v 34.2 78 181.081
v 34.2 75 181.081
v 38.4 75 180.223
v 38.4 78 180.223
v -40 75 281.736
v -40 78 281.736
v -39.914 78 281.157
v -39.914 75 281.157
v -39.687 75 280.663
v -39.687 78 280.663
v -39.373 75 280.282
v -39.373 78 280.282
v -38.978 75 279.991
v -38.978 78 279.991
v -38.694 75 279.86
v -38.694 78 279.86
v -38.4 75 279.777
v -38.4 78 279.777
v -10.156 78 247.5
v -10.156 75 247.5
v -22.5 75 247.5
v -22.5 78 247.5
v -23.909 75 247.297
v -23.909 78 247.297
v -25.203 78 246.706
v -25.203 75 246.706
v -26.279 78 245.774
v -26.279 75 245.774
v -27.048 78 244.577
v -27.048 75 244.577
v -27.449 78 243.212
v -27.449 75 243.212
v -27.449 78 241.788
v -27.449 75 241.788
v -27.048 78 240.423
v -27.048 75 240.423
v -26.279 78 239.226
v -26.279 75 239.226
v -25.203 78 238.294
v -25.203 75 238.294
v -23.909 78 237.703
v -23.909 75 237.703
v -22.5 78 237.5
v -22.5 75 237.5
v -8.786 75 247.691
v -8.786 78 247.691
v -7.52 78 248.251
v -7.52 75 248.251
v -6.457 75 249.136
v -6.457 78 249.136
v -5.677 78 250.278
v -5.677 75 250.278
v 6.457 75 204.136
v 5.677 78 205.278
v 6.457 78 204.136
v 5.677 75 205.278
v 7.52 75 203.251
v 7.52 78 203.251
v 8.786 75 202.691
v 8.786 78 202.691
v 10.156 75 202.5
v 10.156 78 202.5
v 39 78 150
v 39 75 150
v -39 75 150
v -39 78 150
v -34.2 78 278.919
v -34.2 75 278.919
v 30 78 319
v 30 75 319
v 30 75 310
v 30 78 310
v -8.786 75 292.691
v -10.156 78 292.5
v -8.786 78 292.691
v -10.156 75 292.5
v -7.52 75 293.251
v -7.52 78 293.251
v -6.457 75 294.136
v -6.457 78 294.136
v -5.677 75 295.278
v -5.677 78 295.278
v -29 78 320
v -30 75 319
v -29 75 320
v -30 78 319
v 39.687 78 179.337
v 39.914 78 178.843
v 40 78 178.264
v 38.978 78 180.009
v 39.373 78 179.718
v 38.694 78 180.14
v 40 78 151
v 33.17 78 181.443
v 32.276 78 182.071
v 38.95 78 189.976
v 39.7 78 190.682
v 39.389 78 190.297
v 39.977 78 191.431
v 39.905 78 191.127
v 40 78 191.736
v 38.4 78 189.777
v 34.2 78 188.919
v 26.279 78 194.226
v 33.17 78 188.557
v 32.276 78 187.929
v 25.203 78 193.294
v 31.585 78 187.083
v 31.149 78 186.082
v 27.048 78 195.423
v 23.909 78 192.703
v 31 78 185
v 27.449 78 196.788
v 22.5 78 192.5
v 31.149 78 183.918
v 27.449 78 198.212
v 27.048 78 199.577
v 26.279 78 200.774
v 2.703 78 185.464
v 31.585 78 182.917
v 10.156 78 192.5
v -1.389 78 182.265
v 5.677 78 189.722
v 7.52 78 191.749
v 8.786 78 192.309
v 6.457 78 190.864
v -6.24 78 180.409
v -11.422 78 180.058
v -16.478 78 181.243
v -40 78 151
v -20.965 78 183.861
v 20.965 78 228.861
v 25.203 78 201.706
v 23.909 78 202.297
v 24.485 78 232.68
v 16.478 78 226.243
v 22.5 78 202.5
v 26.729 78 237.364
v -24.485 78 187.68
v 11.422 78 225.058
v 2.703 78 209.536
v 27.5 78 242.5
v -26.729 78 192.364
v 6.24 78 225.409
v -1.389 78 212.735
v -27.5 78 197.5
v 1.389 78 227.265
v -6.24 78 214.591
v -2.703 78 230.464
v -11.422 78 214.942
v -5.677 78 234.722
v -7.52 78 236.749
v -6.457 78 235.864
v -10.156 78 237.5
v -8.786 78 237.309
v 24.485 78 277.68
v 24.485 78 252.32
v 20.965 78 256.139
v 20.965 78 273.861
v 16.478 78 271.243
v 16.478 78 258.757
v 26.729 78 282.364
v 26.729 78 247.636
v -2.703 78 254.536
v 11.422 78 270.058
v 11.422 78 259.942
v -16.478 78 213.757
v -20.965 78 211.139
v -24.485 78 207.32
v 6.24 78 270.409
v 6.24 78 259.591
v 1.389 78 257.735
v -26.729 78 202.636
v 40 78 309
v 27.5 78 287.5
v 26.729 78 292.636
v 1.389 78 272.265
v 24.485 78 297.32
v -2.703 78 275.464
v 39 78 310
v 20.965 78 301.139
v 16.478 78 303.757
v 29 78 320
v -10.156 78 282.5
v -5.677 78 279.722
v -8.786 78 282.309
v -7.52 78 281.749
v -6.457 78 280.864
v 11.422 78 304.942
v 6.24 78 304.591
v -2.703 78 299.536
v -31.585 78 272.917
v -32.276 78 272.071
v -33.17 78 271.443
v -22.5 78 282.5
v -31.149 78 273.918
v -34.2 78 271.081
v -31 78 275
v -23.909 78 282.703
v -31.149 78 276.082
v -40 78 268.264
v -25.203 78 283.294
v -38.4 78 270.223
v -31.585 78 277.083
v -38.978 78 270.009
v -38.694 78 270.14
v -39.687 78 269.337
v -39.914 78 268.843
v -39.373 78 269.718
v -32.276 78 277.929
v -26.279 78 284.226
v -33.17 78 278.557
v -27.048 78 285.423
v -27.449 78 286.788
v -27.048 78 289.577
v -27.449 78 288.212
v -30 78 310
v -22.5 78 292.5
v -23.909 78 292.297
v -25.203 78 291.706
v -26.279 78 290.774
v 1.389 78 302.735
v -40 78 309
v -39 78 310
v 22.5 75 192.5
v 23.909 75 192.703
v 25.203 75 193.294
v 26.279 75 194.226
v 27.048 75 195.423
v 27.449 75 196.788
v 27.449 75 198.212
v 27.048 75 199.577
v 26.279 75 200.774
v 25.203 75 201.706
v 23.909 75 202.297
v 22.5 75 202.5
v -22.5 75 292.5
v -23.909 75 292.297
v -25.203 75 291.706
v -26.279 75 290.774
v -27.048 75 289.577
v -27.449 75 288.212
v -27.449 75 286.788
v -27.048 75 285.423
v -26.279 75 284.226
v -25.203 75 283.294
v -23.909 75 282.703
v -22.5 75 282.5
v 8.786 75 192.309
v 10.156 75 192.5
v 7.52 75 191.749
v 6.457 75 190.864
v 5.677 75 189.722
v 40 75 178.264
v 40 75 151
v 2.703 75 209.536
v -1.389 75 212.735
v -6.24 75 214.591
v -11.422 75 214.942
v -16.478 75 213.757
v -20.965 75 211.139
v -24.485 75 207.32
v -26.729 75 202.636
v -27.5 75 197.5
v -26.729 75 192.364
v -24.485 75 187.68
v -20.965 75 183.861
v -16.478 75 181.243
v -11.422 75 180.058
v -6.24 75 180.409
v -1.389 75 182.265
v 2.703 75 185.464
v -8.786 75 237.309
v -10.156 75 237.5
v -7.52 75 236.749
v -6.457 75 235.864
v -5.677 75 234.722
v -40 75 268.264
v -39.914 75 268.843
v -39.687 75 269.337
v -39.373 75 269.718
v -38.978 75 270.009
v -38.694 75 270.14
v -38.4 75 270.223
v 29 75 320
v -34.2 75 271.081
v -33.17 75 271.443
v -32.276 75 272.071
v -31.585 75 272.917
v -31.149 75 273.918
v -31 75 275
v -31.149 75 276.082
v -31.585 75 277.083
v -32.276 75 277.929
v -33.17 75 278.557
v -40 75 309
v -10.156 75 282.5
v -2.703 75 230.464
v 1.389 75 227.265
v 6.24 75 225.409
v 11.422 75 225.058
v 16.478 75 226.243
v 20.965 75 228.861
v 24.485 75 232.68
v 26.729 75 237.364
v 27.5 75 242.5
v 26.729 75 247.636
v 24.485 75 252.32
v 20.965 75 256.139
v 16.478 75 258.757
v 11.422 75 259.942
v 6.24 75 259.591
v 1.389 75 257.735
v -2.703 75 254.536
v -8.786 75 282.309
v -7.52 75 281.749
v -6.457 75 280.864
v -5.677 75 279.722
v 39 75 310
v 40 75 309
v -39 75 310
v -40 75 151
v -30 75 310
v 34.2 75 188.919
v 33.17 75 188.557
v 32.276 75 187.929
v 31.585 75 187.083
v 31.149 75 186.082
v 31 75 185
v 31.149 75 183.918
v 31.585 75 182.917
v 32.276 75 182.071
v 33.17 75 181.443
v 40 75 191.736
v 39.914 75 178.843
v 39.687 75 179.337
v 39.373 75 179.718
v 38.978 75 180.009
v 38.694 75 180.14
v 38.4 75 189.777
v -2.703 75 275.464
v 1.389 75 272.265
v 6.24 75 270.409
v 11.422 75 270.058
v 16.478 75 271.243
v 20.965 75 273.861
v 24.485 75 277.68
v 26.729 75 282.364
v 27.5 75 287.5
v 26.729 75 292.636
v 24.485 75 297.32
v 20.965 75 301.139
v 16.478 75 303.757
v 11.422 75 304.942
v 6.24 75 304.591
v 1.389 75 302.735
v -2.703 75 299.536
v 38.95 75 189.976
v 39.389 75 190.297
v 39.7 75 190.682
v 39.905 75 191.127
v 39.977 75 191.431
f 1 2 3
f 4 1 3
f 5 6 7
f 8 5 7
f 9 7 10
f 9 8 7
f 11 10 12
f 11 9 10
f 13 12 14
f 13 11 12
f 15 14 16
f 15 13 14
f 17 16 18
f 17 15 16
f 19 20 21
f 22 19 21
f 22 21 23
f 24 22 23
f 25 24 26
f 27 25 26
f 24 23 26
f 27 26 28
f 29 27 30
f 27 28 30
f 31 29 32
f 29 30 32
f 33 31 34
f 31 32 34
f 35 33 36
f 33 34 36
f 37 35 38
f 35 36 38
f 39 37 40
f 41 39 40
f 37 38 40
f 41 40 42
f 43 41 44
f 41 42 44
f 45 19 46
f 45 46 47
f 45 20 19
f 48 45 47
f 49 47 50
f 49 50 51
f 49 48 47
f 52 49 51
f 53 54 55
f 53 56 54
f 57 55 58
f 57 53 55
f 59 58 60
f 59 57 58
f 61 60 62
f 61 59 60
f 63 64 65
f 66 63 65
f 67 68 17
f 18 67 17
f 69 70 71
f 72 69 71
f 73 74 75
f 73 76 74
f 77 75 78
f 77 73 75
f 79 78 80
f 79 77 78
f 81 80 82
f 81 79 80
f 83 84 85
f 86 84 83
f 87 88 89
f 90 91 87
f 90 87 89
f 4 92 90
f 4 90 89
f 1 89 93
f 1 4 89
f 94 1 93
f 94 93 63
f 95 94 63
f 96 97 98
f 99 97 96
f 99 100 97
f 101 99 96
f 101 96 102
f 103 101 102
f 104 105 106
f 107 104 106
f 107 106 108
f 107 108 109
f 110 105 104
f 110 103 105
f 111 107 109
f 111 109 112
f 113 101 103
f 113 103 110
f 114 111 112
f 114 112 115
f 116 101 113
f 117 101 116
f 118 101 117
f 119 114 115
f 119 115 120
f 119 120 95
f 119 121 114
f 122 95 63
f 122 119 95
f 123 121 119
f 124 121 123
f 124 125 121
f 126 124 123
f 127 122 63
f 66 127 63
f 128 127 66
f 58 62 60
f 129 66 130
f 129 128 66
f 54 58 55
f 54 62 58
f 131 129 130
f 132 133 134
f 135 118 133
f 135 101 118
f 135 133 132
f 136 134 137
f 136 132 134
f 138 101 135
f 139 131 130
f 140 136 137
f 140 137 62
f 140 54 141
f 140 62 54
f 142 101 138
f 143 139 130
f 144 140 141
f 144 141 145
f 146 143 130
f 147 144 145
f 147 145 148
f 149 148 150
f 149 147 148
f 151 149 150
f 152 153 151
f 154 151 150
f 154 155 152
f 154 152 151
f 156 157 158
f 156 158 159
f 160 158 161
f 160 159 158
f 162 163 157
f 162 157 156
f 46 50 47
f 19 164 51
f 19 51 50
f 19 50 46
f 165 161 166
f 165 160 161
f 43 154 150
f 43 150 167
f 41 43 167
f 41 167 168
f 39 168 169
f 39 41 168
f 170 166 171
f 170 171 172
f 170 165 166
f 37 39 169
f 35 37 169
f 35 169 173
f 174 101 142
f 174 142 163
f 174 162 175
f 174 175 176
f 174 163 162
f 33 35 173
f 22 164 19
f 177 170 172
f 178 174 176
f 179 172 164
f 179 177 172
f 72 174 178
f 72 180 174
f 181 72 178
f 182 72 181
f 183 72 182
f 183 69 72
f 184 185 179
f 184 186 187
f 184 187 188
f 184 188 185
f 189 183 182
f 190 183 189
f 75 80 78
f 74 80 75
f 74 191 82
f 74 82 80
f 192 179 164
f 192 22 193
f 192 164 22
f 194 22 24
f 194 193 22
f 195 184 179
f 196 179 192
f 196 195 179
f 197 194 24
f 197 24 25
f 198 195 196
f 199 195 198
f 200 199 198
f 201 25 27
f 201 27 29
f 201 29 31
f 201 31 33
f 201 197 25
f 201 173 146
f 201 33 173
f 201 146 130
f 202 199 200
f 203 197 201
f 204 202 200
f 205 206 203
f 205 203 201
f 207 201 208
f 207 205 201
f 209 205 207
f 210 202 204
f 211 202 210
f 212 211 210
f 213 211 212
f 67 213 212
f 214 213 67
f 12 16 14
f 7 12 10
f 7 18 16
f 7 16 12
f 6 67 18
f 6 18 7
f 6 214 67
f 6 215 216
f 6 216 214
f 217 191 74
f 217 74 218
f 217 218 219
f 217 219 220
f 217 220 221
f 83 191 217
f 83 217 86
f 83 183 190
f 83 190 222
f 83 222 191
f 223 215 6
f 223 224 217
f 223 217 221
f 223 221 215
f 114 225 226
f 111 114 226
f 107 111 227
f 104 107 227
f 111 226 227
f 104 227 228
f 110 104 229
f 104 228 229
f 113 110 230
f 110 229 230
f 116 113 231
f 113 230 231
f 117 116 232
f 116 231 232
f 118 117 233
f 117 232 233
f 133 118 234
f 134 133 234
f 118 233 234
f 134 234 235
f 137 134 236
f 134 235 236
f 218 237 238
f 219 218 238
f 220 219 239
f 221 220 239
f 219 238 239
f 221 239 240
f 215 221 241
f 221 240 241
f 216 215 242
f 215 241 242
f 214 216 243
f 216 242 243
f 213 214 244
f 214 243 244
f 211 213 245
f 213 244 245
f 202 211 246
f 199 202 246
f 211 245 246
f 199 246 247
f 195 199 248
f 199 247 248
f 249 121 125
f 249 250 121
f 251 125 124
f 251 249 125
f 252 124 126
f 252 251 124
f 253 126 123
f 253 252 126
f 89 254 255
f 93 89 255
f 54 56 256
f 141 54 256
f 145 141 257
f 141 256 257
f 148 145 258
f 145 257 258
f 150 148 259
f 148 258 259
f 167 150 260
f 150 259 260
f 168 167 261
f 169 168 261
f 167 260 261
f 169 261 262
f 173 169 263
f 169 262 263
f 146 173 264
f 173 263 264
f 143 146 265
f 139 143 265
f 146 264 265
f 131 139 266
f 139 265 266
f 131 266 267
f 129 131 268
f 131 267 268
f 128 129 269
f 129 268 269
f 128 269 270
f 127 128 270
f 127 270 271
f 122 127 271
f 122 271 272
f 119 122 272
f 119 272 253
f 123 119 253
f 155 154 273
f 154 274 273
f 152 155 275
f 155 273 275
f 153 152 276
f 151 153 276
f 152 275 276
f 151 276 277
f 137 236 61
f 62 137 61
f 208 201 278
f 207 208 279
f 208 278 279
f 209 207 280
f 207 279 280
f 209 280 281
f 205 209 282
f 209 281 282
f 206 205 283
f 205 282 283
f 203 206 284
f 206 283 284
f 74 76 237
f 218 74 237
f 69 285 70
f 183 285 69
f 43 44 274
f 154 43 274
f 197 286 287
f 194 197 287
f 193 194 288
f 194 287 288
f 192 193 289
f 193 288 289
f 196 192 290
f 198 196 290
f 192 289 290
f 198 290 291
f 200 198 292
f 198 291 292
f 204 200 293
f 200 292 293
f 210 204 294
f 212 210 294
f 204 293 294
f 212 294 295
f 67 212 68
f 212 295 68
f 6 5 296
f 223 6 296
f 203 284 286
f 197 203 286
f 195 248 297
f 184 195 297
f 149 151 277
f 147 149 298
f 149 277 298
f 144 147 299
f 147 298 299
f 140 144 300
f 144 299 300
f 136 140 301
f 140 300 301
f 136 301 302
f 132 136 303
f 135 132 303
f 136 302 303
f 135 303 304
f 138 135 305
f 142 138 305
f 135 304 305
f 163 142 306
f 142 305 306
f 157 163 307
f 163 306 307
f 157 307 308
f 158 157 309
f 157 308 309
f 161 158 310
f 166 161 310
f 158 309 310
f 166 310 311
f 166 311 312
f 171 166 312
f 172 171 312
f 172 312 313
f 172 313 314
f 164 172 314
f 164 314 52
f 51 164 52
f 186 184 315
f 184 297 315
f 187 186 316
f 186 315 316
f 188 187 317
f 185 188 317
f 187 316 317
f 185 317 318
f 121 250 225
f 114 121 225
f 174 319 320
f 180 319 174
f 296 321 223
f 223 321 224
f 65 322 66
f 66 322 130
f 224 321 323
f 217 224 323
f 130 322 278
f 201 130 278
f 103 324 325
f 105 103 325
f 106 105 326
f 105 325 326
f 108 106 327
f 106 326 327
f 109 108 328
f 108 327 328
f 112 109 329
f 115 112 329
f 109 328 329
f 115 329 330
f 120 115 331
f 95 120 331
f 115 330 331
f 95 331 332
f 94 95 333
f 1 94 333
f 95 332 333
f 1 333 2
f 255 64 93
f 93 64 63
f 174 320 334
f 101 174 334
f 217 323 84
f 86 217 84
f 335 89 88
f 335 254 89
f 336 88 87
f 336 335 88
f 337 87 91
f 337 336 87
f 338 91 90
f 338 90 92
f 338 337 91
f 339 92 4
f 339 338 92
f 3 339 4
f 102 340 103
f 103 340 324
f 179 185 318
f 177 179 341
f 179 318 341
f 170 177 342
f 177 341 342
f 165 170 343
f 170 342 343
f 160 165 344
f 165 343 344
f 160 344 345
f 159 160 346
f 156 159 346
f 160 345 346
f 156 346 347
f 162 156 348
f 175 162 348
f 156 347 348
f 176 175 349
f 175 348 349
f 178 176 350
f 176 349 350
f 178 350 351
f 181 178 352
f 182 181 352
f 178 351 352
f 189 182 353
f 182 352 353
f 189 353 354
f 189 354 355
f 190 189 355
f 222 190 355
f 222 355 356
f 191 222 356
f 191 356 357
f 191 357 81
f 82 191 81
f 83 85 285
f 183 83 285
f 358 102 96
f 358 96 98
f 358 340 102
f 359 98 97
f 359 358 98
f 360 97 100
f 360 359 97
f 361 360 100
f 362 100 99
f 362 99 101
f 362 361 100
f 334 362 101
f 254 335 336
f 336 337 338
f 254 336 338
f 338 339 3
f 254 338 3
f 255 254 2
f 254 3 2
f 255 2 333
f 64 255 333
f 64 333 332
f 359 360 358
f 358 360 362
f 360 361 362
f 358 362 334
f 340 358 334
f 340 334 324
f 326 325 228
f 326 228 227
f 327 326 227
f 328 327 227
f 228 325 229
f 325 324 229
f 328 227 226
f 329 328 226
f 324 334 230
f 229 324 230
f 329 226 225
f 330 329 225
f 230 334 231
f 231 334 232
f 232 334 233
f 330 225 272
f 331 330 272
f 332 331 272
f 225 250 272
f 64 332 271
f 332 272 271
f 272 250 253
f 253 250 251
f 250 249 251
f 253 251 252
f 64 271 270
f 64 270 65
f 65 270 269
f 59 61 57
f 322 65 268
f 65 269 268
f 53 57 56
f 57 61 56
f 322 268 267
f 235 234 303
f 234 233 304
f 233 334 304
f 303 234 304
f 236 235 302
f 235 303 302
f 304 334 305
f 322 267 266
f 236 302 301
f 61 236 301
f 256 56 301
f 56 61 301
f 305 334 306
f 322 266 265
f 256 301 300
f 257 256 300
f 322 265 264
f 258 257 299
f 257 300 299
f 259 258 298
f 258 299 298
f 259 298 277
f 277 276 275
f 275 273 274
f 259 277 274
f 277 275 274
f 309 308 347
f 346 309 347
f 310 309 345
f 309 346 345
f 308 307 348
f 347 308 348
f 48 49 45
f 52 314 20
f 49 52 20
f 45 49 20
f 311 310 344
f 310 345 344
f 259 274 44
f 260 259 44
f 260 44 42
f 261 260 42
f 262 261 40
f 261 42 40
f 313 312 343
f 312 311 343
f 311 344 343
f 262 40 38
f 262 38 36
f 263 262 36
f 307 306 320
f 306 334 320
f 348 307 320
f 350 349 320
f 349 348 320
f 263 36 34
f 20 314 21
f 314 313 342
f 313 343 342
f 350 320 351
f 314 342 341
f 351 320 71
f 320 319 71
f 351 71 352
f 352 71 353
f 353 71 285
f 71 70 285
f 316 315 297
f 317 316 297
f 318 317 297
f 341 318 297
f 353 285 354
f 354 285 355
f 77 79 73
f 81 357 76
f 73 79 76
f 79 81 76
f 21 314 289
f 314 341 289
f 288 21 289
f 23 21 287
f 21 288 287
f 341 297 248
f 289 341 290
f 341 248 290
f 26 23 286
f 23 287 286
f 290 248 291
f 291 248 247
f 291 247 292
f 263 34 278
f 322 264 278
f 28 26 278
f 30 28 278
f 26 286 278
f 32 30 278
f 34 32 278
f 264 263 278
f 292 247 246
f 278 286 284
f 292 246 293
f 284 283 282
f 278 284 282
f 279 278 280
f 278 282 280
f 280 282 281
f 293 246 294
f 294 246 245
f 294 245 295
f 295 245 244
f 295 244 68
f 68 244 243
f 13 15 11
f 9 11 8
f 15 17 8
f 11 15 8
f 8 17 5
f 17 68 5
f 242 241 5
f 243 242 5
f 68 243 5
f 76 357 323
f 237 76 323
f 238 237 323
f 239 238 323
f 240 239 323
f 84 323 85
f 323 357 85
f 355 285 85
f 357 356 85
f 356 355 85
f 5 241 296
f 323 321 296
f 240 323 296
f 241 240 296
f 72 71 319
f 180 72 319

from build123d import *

# Parameters (mm, degrees)
SKETCH226_R     = 17.5
PAD114_DEPTH    = 3
POCKET054_DEPTH = 3.001
FILLET072_R     = 2
CHAMFER079_SIZE = 1
POCKET055_DEPTH = 5
FILLET073_R     = 5


with BuildPart() as part:
    # Sketch226 → Pad114 (new body)
    with BuildSketch(Plane.XZ):
        Polygon((40, 150), (-40, 150), (-40, 310), (-30, 310), (-30, 320), (30, 320), (30, 310), (40, 310), align=None)
        with Locations((10, 287.5)):
            Circle(SKETCH226_R, mode=Mode.SUBTRACT)
        with Locations((10, 242.5)):
            Circle(SKETCH226_R, mode=Mode.SUBTRACT)
        with Locations((-10, 197.5)):
            Circle(SKETCH226_R, mode=Mode.SUBTRACT)
    extrude(amount=-PAD114_DEPTH)

    # Sketch227 → Pocket054 (cut, through all)
    with BuildSketch(Plane.XZ):
        with BuildLine():
            ThreePointArc((-39, 279.898979), (-45, 275), (-39, 270.101021))
            Line((-39, 270.101021), (-34.2, 271.080816))
            ThreePointArc((-34.2, 271.080816), (-31, 275), (-34.2, 278.919184))
            Line((-34.2, 278.919184), (-39, 279.898979))
        make_face()
        with BuildLine():
            ThreePointArc((39, 180.101021), (45, 185), (39, 189.898979))
            Line((39, 189.898979), (34.2, 188.919184))
            ThreePointArc((34.2, 188.919184), (31, 185), (34.2, 181.080816))
            Line((34.2, 181.080816), (39, 180.101021))
        make_face()
    extrude(amount=-POCKET054_DEPTH, mode=Mode.SUBTRACT)

    # Fillet072
    fillet072_edges = [part.edges().sort_by_distance(p)[0] for p in [
        (40, 1.5, 180),
        (40, 1.5, 190),
        (-40, 1.5, 270),
        (-40, 1.5, 280),
    ]]
    fillet(fillet072_edges, radius=FILLET072_R)

    # Chamfer079
    chamfer079_edges = [part.edges().sort_by_distance(p)[0] for p in [
        (-30, 1.5, 320),
        (-40, 1.5, 310),
        (30, 1.5, 320),
        (40, 1.5, 310),
        (-40, 1.5, 150),
        (40, 1.5, 150),
    ]]
    chamfer(chamfer079_edges, length=CHAMFER079_SIZE)

    # Sketch228 → Pocket055 (cut)
    with BuildSketch(Plane.XZ):
        with BuildLine():
            ThreePointArc((10, 282.5), (15, 287.5), (10, 292.5))
            Line((10, 292.5), (-22.5, 292.5))
            ThreePointArc((-22.5, 292.5), (-27.5, 287.5), (-22.5, 282.5))
            Line((-22.5, 282.5), (10, 282.5))
        make_face()
        with BuildLine():
            ThreePointArc((10, 237.5), (15, 242.5), (10, 247.5))
            Line((10, 247.5), (-22.5, 247.5))
            ThreePointArc((-22.5, 247.5), (-27.5, 242.5), (-22.5, 237.5))
            Line((-22.5, 237.5), (10, 237.5))
        make_face()
        with BuildLine():
            ThreePointArc((-10, 202.5), (-15, 197.5), (-10, 192.5))
            Line((-10, 192.5), (22.5, 192.5))
            ThreePointArc((22.5, 192.5), (27.5, 197.5), (22.5, 202.5))
            Line((22.5, 202.5), (-10, 202.5))
        make_face()
    extrude(amount=-POCKET055_DEPTH, mode=Mode.SUBTRACT)

    # Fillet073
    fillet073_edges = [part.edges().sort_by_distance(p)[0] for p in [
        (-6.77051, 1.5, 292.5),
        (-6.77051, 1.5, 282.5),
        (-6.77051, 1.5, 237.5),
        (-6.77051, 1.5, 247.5),
        (6.77051, 1.5, 192.5),
        (6.77051, 1.5, 202.5),
    ]]
    fillet(fillet073_edges, radius=FILLET073_R)


with BuildPart() as part_1:
    # Body098 placement: moved
    add(part.part.moved(Location((0, 75, 0))))


solid = part_1.part
